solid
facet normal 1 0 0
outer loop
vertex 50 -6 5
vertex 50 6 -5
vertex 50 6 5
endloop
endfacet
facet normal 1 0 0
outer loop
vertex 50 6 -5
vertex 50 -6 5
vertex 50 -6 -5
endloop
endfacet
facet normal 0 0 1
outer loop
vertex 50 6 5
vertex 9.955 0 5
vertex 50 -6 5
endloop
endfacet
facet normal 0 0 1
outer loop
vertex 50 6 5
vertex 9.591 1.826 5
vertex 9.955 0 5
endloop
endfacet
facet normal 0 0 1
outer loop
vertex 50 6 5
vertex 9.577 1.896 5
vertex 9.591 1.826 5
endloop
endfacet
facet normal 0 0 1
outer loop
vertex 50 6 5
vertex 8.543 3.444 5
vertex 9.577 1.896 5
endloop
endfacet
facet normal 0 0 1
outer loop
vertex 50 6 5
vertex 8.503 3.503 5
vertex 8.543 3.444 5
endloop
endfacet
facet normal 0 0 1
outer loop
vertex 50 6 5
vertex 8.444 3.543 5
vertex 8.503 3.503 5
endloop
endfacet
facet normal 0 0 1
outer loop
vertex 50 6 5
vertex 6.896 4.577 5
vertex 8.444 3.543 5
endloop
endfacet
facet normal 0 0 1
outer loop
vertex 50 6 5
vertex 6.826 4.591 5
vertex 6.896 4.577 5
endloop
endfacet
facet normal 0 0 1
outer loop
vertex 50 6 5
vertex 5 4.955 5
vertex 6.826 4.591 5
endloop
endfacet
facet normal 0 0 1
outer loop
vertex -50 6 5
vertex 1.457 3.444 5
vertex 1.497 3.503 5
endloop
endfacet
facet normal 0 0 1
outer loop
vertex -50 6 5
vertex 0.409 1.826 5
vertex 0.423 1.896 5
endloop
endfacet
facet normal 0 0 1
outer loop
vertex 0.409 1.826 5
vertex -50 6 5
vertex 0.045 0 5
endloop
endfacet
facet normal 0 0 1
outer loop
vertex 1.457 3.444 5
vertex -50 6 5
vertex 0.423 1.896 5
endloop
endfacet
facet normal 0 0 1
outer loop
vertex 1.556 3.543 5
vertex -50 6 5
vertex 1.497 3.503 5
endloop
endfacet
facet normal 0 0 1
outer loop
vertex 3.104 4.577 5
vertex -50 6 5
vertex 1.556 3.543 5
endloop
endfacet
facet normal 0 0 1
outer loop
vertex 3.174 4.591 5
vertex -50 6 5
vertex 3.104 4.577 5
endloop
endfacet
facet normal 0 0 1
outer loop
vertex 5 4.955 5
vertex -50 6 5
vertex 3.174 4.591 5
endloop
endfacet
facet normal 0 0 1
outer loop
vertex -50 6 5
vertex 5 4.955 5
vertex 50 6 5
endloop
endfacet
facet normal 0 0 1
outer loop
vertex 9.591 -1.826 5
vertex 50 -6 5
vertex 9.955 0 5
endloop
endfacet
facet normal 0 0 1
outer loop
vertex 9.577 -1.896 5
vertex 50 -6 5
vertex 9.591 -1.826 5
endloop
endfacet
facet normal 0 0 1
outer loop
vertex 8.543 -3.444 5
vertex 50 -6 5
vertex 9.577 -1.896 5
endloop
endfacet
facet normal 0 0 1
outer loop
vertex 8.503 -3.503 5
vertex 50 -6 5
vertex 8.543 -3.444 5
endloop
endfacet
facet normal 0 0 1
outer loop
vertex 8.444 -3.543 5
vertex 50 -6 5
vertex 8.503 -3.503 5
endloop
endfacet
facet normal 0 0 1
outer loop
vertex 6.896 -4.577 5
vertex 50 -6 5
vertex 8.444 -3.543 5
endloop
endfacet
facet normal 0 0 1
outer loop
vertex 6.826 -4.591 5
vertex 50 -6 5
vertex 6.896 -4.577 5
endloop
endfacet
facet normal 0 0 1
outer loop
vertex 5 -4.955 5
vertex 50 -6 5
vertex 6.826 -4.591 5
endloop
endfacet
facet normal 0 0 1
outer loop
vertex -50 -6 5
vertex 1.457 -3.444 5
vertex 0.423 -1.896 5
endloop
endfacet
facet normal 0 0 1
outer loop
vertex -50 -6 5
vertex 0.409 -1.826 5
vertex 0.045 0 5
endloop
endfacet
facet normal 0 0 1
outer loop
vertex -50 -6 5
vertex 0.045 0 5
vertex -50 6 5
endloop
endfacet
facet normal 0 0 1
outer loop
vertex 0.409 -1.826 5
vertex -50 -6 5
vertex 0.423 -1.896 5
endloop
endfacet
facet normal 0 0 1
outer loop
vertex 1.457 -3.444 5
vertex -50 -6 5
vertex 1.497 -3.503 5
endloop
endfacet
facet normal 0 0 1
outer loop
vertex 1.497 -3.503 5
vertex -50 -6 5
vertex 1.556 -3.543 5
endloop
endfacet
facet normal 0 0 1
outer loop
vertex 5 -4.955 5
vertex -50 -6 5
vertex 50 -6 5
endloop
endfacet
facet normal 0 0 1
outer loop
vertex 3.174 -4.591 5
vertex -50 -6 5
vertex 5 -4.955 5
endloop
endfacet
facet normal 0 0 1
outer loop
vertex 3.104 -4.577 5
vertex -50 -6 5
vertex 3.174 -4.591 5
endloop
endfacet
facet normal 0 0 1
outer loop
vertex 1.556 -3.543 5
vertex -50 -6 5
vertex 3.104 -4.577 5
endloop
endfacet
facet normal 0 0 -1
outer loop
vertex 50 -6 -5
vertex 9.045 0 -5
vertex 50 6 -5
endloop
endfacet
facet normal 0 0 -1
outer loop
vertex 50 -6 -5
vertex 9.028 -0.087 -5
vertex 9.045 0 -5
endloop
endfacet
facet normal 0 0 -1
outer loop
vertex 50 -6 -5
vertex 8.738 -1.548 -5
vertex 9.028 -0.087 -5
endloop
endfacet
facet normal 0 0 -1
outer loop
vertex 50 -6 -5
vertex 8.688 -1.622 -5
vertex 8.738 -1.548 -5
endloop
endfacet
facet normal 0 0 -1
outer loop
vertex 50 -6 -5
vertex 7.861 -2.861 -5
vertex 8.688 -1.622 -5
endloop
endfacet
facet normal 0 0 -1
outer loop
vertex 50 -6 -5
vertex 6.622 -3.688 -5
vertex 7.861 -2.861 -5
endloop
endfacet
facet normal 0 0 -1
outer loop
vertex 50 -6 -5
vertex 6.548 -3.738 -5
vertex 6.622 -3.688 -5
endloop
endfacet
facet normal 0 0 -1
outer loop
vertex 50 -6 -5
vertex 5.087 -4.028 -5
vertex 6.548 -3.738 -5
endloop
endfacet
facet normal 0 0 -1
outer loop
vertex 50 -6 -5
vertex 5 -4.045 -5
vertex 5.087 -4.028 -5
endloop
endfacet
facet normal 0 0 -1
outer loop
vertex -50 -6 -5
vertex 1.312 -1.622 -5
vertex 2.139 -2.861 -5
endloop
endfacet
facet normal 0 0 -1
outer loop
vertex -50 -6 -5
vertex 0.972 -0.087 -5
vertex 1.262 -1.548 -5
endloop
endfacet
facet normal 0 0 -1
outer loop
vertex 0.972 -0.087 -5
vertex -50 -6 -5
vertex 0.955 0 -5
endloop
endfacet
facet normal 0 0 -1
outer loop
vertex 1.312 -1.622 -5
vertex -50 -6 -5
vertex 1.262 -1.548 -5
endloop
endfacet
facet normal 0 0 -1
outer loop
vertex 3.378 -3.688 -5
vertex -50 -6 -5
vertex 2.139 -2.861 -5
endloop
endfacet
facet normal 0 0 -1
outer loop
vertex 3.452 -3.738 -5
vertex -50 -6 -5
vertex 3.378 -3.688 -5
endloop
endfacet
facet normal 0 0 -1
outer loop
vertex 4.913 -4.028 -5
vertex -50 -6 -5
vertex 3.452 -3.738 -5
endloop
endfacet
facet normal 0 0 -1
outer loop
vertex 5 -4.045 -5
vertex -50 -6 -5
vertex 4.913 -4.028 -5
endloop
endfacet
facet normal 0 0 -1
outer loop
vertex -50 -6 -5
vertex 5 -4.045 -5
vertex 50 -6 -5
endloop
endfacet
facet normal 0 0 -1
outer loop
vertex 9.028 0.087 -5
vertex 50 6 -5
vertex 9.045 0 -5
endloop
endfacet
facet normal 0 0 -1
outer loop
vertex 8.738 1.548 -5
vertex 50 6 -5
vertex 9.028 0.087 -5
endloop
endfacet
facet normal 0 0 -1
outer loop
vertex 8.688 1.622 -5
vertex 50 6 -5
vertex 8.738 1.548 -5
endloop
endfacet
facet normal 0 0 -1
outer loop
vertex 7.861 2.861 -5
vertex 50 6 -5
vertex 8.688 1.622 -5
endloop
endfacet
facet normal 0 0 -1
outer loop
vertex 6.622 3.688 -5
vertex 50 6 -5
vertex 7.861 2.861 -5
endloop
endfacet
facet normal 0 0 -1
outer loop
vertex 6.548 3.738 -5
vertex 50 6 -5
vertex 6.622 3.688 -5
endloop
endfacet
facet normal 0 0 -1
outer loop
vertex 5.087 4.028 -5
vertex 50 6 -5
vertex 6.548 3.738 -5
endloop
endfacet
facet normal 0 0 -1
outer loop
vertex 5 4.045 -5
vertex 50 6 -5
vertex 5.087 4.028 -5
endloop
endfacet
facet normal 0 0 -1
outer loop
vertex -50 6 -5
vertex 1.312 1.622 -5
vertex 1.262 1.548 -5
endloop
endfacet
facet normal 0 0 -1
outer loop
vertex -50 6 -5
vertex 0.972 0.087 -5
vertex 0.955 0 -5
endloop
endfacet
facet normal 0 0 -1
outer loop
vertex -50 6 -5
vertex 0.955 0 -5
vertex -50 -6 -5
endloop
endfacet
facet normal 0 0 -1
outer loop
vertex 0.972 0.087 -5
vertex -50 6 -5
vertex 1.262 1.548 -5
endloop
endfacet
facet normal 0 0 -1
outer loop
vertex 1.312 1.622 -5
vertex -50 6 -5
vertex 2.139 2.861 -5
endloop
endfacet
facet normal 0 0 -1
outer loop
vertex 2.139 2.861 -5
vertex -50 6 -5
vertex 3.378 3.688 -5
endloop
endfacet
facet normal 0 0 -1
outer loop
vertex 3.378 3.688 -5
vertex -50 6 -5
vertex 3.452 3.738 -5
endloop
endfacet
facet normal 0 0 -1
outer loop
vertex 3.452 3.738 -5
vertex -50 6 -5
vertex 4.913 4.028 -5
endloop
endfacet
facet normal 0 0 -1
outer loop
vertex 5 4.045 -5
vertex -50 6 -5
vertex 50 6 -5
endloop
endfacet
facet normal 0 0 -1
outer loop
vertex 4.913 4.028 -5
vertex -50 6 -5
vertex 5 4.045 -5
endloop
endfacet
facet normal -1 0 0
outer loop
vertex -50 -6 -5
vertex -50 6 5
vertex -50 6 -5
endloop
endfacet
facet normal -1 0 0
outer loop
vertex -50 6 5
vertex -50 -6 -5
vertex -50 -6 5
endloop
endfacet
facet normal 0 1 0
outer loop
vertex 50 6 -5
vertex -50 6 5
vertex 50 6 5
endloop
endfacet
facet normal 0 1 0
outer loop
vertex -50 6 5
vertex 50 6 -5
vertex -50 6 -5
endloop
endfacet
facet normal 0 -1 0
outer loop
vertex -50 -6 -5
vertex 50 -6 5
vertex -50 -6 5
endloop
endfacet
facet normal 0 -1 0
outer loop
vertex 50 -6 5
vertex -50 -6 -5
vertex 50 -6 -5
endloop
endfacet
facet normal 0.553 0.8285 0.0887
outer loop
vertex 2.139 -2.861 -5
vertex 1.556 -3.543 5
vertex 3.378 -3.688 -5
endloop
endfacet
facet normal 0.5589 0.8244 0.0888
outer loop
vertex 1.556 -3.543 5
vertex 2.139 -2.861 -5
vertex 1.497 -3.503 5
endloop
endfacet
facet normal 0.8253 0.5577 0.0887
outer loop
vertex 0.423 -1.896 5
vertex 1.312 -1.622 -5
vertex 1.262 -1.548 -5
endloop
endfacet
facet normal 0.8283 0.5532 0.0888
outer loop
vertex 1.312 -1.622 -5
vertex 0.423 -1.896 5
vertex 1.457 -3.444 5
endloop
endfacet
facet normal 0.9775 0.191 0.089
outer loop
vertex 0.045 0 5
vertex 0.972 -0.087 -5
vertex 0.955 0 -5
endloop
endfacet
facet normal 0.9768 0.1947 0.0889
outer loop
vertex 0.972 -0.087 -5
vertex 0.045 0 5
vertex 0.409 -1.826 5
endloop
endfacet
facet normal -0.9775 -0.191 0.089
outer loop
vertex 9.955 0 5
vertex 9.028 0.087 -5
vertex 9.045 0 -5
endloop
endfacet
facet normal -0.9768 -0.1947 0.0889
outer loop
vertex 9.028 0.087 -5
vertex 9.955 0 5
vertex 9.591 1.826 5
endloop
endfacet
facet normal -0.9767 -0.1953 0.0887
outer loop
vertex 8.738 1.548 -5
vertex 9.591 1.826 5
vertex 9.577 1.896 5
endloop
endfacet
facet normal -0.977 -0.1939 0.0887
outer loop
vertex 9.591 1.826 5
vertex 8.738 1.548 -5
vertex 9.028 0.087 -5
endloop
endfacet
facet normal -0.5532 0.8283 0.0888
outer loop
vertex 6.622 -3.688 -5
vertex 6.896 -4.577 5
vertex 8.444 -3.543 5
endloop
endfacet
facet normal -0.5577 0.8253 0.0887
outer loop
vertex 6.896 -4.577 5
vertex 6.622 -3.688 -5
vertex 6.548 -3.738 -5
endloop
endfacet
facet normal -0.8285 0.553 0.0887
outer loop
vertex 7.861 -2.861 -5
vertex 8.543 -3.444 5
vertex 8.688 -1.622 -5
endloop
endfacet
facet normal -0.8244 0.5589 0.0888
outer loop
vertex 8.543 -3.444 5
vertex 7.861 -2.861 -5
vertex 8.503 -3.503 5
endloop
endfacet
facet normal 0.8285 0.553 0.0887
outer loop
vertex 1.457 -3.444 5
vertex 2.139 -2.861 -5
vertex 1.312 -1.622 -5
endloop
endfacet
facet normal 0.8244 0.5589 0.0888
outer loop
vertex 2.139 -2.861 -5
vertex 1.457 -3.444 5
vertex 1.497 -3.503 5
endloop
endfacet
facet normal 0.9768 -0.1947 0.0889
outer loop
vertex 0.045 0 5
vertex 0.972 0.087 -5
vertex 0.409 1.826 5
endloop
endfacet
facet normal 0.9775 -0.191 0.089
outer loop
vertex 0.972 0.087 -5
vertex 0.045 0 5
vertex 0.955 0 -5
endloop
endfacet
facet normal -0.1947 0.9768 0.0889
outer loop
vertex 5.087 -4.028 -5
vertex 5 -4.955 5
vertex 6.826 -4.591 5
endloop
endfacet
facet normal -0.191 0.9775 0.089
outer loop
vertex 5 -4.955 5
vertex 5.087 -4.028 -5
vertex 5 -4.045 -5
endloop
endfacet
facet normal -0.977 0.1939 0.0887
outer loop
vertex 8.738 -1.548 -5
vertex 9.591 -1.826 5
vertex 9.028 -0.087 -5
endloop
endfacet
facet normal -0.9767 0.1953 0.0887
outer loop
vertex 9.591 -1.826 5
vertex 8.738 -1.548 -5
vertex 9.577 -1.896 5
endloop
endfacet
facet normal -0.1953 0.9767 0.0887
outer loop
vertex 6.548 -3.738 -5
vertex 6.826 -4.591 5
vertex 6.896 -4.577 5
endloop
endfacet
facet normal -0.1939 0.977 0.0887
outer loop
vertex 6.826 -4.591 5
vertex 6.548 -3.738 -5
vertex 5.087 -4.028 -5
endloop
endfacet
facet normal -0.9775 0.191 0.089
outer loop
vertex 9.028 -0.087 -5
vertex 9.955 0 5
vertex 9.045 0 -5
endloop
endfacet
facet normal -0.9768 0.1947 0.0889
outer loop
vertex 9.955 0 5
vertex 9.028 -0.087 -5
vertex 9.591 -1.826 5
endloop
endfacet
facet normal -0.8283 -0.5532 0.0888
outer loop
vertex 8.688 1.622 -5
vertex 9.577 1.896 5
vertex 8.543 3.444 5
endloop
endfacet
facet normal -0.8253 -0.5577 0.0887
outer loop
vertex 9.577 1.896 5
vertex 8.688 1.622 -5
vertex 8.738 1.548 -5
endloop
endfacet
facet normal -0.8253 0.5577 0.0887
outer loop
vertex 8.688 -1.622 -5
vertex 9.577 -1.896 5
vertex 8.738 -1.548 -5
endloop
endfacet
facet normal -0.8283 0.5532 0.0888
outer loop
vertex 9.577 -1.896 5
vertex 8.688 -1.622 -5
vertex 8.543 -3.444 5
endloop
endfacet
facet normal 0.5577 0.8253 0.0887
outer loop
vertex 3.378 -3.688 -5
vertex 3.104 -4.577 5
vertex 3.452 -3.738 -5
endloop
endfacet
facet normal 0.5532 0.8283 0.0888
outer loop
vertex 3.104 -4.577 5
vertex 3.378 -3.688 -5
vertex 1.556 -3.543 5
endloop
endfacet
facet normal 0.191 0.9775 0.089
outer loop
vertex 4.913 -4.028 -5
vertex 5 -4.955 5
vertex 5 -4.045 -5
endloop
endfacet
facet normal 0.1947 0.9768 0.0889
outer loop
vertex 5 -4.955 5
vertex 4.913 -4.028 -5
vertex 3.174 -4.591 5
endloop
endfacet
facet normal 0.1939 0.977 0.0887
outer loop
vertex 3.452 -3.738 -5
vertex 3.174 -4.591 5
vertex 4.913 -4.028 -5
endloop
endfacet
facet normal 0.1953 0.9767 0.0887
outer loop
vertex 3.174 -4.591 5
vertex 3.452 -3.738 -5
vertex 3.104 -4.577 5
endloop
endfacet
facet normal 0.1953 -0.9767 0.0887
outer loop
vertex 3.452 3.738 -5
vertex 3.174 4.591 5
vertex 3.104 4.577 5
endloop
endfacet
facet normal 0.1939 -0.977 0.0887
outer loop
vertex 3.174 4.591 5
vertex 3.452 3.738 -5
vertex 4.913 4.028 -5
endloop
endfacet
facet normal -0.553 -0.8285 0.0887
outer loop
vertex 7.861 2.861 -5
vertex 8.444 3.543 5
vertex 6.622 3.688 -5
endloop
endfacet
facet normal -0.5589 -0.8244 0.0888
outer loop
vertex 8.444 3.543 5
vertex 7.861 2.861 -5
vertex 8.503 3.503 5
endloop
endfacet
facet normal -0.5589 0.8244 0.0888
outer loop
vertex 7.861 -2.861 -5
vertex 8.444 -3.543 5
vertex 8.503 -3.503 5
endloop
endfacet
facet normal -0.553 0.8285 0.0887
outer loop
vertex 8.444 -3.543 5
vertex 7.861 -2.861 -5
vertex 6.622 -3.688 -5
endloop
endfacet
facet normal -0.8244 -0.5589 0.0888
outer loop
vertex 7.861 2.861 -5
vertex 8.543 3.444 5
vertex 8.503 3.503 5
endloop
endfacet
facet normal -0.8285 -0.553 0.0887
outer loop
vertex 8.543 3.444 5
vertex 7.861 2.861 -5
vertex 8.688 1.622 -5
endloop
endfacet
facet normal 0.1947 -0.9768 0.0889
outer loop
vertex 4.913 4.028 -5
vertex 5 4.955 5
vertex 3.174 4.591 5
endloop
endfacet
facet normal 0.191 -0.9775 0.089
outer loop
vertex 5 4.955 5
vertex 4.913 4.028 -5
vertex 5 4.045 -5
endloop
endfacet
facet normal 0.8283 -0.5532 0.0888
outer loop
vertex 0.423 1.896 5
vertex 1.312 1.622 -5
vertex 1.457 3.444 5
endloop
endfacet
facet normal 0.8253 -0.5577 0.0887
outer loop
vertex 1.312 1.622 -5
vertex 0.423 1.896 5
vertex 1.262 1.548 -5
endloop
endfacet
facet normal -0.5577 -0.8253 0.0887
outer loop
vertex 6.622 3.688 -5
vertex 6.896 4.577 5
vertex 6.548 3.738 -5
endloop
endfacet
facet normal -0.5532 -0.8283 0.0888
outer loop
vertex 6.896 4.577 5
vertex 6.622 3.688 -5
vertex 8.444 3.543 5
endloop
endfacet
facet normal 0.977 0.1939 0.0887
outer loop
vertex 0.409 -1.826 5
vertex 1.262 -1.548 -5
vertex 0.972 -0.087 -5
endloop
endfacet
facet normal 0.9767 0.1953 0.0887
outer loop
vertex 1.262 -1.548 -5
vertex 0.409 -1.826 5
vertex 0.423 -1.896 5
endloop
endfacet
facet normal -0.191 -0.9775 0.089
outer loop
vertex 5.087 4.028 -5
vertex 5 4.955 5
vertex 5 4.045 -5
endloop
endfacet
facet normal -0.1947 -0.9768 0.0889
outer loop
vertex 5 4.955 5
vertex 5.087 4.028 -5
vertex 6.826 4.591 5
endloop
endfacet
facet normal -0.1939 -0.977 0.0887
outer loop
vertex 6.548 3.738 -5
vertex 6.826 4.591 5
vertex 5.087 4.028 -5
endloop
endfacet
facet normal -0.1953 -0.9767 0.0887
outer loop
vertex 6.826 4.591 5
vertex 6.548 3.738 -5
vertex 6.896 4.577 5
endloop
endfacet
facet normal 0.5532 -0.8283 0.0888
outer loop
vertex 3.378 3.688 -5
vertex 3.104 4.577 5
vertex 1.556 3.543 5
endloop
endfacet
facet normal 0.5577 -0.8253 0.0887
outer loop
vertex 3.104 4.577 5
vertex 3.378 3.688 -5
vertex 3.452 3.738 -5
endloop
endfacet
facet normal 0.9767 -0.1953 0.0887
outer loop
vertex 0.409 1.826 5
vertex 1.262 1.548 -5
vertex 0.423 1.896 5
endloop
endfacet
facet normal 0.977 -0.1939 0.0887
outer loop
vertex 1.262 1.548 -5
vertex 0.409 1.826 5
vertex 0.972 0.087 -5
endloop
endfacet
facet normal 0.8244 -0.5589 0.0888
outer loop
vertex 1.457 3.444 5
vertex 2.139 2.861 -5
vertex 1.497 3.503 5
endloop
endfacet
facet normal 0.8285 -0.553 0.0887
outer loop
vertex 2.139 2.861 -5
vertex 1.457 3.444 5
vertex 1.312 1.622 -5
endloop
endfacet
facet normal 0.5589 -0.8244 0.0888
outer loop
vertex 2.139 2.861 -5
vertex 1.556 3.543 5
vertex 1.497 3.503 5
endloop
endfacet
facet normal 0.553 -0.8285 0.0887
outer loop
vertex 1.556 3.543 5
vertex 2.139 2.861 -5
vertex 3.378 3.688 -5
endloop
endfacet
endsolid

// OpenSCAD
module holder()
{
  difference() {
      cube([100, 12, 10], center = true);
    translate([5, 0, 0]) {
      cylinder(h = 11, r1 = 4, r2 = 5, center = true);
    };
  }
}

echo(version=version());

holder();
